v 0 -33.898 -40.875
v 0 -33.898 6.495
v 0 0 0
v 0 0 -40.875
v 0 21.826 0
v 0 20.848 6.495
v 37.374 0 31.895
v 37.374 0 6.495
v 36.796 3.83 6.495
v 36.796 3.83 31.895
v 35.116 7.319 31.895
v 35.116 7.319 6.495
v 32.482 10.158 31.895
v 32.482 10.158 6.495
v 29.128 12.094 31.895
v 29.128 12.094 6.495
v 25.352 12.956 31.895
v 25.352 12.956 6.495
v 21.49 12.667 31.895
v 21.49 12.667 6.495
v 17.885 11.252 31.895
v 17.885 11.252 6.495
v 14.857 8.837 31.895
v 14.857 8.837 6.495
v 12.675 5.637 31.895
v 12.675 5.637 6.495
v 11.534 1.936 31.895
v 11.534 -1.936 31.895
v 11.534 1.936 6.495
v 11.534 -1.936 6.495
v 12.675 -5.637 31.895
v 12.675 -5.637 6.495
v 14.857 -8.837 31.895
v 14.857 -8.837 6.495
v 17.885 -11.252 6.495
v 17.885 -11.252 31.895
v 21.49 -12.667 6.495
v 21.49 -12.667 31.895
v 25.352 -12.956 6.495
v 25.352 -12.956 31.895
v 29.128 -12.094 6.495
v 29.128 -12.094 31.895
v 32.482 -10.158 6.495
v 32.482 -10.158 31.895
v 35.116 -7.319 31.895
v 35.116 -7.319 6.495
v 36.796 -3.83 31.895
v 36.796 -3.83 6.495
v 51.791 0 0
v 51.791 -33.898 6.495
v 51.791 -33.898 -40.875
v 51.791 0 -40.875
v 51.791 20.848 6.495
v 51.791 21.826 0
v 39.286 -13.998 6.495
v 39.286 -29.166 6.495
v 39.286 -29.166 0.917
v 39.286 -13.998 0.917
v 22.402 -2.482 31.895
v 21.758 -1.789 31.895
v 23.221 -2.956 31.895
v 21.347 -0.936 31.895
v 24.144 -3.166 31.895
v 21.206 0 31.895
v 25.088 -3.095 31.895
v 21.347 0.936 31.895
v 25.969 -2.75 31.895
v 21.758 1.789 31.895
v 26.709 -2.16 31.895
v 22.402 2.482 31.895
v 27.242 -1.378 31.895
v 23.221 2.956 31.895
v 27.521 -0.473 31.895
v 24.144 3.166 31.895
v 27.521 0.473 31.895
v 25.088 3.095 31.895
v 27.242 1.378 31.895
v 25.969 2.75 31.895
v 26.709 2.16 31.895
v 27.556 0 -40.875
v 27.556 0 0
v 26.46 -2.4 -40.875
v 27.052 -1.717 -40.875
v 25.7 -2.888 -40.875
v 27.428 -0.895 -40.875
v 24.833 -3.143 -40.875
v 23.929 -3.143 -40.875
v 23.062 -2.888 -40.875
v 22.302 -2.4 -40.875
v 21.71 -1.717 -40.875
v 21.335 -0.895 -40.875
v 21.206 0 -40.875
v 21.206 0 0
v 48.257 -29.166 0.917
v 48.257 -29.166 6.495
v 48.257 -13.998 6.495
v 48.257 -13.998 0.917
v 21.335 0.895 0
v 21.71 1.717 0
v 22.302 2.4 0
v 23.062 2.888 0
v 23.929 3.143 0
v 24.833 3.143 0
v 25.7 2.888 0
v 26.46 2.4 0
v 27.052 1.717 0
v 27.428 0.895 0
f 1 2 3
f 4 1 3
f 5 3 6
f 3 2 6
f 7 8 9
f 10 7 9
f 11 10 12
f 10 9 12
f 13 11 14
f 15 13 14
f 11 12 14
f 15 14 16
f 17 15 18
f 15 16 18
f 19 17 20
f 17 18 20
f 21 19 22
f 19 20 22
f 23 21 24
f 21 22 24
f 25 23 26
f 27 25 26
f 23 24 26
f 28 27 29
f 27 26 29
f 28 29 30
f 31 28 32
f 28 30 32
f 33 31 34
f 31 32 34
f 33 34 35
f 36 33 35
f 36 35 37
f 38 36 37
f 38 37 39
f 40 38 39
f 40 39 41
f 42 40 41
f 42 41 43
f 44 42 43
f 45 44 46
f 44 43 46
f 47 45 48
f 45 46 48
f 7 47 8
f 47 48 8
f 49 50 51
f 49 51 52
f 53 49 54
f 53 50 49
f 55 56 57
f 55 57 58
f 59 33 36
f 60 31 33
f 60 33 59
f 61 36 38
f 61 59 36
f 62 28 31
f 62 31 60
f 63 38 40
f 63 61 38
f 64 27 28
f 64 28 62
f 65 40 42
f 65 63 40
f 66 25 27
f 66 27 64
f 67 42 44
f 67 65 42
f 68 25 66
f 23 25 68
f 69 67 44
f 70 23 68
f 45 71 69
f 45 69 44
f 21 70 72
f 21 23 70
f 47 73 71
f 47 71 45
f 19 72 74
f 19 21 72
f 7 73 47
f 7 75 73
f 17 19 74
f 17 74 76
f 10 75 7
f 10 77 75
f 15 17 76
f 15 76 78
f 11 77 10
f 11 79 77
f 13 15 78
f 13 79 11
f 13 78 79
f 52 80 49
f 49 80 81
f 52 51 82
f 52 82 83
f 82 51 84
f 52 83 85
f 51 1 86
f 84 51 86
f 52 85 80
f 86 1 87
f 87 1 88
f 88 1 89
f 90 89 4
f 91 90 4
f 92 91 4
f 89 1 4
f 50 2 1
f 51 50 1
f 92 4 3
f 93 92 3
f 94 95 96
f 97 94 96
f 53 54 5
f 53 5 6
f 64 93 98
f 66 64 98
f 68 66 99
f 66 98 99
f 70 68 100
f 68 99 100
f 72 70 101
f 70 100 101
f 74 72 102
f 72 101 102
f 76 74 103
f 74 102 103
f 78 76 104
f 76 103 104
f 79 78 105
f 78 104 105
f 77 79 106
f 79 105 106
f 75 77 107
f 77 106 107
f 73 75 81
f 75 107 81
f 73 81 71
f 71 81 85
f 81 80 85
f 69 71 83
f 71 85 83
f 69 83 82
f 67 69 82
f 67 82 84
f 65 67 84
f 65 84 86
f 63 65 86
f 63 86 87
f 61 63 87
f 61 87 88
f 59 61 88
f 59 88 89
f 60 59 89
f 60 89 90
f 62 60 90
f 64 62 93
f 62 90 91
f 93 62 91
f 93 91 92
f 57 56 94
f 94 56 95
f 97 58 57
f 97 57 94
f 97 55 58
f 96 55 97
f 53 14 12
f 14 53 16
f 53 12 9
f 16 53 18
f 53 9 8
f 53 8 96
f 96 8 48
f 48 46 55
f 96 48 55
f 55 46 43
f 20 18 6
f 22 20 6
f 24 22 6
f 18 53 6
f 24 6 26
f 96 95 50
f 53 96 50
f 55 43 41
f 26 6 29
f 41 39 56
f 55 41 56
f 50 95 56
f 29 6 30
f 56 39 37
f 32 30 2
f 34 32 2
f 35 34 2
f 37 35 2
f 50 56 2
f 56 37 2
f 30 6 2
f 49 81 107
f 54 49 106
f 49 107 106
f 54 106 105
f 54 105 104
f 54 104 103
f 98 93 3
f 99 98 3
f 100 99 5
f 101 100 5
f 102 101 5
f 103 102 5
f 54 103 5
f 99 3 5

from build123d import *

# Parameters (mm, degrees)
F1_DEPTH = 51.791012
F2_R     = 12.992445
F3_DEPTH = 25.4
F5_D     = 6.35
F6_W     = 8.970857
F6_H     = 15.168444
F7_DEPTH = 5.578703


with BuildPart() as f1:
    # F0 (on Right) → F1 (new body)
    with BuildSketch(Plane.YZ):
        Polygon((21.825537, 0), (20.848211, 6.495342), (-33.898331, 6.495342), (-33.898331, -40.874604), (0, -40.874604), (0, 0), align=None)
    extrude(amount=F1_DEPTH)

    # F2 (on face) → F3 (join)
    with BuildSketch(Plane.XY.offset(6.495342)):
        with Locations((24.38122, 0)):
            Circle(F2_R)
    extrude(amount=F3_DEPTH)

    # F5 (through all)
    with Locations(Plane.XY.offset(31.895342)):
        with Locations((24.38122, 0)):
            Hole(F5_D / 2)

    # F6 (on face) → F7 (cut)
    with BuildSketch(Plane.XY.offset(6.495342)):
        with Locations((43.771073, -21.581918)):
            Rectangle(F6_W, F6_H)
    extrude(amount=-F7_DEPTH, mode=Mode.SUBTRACT)


solid = f1.part
